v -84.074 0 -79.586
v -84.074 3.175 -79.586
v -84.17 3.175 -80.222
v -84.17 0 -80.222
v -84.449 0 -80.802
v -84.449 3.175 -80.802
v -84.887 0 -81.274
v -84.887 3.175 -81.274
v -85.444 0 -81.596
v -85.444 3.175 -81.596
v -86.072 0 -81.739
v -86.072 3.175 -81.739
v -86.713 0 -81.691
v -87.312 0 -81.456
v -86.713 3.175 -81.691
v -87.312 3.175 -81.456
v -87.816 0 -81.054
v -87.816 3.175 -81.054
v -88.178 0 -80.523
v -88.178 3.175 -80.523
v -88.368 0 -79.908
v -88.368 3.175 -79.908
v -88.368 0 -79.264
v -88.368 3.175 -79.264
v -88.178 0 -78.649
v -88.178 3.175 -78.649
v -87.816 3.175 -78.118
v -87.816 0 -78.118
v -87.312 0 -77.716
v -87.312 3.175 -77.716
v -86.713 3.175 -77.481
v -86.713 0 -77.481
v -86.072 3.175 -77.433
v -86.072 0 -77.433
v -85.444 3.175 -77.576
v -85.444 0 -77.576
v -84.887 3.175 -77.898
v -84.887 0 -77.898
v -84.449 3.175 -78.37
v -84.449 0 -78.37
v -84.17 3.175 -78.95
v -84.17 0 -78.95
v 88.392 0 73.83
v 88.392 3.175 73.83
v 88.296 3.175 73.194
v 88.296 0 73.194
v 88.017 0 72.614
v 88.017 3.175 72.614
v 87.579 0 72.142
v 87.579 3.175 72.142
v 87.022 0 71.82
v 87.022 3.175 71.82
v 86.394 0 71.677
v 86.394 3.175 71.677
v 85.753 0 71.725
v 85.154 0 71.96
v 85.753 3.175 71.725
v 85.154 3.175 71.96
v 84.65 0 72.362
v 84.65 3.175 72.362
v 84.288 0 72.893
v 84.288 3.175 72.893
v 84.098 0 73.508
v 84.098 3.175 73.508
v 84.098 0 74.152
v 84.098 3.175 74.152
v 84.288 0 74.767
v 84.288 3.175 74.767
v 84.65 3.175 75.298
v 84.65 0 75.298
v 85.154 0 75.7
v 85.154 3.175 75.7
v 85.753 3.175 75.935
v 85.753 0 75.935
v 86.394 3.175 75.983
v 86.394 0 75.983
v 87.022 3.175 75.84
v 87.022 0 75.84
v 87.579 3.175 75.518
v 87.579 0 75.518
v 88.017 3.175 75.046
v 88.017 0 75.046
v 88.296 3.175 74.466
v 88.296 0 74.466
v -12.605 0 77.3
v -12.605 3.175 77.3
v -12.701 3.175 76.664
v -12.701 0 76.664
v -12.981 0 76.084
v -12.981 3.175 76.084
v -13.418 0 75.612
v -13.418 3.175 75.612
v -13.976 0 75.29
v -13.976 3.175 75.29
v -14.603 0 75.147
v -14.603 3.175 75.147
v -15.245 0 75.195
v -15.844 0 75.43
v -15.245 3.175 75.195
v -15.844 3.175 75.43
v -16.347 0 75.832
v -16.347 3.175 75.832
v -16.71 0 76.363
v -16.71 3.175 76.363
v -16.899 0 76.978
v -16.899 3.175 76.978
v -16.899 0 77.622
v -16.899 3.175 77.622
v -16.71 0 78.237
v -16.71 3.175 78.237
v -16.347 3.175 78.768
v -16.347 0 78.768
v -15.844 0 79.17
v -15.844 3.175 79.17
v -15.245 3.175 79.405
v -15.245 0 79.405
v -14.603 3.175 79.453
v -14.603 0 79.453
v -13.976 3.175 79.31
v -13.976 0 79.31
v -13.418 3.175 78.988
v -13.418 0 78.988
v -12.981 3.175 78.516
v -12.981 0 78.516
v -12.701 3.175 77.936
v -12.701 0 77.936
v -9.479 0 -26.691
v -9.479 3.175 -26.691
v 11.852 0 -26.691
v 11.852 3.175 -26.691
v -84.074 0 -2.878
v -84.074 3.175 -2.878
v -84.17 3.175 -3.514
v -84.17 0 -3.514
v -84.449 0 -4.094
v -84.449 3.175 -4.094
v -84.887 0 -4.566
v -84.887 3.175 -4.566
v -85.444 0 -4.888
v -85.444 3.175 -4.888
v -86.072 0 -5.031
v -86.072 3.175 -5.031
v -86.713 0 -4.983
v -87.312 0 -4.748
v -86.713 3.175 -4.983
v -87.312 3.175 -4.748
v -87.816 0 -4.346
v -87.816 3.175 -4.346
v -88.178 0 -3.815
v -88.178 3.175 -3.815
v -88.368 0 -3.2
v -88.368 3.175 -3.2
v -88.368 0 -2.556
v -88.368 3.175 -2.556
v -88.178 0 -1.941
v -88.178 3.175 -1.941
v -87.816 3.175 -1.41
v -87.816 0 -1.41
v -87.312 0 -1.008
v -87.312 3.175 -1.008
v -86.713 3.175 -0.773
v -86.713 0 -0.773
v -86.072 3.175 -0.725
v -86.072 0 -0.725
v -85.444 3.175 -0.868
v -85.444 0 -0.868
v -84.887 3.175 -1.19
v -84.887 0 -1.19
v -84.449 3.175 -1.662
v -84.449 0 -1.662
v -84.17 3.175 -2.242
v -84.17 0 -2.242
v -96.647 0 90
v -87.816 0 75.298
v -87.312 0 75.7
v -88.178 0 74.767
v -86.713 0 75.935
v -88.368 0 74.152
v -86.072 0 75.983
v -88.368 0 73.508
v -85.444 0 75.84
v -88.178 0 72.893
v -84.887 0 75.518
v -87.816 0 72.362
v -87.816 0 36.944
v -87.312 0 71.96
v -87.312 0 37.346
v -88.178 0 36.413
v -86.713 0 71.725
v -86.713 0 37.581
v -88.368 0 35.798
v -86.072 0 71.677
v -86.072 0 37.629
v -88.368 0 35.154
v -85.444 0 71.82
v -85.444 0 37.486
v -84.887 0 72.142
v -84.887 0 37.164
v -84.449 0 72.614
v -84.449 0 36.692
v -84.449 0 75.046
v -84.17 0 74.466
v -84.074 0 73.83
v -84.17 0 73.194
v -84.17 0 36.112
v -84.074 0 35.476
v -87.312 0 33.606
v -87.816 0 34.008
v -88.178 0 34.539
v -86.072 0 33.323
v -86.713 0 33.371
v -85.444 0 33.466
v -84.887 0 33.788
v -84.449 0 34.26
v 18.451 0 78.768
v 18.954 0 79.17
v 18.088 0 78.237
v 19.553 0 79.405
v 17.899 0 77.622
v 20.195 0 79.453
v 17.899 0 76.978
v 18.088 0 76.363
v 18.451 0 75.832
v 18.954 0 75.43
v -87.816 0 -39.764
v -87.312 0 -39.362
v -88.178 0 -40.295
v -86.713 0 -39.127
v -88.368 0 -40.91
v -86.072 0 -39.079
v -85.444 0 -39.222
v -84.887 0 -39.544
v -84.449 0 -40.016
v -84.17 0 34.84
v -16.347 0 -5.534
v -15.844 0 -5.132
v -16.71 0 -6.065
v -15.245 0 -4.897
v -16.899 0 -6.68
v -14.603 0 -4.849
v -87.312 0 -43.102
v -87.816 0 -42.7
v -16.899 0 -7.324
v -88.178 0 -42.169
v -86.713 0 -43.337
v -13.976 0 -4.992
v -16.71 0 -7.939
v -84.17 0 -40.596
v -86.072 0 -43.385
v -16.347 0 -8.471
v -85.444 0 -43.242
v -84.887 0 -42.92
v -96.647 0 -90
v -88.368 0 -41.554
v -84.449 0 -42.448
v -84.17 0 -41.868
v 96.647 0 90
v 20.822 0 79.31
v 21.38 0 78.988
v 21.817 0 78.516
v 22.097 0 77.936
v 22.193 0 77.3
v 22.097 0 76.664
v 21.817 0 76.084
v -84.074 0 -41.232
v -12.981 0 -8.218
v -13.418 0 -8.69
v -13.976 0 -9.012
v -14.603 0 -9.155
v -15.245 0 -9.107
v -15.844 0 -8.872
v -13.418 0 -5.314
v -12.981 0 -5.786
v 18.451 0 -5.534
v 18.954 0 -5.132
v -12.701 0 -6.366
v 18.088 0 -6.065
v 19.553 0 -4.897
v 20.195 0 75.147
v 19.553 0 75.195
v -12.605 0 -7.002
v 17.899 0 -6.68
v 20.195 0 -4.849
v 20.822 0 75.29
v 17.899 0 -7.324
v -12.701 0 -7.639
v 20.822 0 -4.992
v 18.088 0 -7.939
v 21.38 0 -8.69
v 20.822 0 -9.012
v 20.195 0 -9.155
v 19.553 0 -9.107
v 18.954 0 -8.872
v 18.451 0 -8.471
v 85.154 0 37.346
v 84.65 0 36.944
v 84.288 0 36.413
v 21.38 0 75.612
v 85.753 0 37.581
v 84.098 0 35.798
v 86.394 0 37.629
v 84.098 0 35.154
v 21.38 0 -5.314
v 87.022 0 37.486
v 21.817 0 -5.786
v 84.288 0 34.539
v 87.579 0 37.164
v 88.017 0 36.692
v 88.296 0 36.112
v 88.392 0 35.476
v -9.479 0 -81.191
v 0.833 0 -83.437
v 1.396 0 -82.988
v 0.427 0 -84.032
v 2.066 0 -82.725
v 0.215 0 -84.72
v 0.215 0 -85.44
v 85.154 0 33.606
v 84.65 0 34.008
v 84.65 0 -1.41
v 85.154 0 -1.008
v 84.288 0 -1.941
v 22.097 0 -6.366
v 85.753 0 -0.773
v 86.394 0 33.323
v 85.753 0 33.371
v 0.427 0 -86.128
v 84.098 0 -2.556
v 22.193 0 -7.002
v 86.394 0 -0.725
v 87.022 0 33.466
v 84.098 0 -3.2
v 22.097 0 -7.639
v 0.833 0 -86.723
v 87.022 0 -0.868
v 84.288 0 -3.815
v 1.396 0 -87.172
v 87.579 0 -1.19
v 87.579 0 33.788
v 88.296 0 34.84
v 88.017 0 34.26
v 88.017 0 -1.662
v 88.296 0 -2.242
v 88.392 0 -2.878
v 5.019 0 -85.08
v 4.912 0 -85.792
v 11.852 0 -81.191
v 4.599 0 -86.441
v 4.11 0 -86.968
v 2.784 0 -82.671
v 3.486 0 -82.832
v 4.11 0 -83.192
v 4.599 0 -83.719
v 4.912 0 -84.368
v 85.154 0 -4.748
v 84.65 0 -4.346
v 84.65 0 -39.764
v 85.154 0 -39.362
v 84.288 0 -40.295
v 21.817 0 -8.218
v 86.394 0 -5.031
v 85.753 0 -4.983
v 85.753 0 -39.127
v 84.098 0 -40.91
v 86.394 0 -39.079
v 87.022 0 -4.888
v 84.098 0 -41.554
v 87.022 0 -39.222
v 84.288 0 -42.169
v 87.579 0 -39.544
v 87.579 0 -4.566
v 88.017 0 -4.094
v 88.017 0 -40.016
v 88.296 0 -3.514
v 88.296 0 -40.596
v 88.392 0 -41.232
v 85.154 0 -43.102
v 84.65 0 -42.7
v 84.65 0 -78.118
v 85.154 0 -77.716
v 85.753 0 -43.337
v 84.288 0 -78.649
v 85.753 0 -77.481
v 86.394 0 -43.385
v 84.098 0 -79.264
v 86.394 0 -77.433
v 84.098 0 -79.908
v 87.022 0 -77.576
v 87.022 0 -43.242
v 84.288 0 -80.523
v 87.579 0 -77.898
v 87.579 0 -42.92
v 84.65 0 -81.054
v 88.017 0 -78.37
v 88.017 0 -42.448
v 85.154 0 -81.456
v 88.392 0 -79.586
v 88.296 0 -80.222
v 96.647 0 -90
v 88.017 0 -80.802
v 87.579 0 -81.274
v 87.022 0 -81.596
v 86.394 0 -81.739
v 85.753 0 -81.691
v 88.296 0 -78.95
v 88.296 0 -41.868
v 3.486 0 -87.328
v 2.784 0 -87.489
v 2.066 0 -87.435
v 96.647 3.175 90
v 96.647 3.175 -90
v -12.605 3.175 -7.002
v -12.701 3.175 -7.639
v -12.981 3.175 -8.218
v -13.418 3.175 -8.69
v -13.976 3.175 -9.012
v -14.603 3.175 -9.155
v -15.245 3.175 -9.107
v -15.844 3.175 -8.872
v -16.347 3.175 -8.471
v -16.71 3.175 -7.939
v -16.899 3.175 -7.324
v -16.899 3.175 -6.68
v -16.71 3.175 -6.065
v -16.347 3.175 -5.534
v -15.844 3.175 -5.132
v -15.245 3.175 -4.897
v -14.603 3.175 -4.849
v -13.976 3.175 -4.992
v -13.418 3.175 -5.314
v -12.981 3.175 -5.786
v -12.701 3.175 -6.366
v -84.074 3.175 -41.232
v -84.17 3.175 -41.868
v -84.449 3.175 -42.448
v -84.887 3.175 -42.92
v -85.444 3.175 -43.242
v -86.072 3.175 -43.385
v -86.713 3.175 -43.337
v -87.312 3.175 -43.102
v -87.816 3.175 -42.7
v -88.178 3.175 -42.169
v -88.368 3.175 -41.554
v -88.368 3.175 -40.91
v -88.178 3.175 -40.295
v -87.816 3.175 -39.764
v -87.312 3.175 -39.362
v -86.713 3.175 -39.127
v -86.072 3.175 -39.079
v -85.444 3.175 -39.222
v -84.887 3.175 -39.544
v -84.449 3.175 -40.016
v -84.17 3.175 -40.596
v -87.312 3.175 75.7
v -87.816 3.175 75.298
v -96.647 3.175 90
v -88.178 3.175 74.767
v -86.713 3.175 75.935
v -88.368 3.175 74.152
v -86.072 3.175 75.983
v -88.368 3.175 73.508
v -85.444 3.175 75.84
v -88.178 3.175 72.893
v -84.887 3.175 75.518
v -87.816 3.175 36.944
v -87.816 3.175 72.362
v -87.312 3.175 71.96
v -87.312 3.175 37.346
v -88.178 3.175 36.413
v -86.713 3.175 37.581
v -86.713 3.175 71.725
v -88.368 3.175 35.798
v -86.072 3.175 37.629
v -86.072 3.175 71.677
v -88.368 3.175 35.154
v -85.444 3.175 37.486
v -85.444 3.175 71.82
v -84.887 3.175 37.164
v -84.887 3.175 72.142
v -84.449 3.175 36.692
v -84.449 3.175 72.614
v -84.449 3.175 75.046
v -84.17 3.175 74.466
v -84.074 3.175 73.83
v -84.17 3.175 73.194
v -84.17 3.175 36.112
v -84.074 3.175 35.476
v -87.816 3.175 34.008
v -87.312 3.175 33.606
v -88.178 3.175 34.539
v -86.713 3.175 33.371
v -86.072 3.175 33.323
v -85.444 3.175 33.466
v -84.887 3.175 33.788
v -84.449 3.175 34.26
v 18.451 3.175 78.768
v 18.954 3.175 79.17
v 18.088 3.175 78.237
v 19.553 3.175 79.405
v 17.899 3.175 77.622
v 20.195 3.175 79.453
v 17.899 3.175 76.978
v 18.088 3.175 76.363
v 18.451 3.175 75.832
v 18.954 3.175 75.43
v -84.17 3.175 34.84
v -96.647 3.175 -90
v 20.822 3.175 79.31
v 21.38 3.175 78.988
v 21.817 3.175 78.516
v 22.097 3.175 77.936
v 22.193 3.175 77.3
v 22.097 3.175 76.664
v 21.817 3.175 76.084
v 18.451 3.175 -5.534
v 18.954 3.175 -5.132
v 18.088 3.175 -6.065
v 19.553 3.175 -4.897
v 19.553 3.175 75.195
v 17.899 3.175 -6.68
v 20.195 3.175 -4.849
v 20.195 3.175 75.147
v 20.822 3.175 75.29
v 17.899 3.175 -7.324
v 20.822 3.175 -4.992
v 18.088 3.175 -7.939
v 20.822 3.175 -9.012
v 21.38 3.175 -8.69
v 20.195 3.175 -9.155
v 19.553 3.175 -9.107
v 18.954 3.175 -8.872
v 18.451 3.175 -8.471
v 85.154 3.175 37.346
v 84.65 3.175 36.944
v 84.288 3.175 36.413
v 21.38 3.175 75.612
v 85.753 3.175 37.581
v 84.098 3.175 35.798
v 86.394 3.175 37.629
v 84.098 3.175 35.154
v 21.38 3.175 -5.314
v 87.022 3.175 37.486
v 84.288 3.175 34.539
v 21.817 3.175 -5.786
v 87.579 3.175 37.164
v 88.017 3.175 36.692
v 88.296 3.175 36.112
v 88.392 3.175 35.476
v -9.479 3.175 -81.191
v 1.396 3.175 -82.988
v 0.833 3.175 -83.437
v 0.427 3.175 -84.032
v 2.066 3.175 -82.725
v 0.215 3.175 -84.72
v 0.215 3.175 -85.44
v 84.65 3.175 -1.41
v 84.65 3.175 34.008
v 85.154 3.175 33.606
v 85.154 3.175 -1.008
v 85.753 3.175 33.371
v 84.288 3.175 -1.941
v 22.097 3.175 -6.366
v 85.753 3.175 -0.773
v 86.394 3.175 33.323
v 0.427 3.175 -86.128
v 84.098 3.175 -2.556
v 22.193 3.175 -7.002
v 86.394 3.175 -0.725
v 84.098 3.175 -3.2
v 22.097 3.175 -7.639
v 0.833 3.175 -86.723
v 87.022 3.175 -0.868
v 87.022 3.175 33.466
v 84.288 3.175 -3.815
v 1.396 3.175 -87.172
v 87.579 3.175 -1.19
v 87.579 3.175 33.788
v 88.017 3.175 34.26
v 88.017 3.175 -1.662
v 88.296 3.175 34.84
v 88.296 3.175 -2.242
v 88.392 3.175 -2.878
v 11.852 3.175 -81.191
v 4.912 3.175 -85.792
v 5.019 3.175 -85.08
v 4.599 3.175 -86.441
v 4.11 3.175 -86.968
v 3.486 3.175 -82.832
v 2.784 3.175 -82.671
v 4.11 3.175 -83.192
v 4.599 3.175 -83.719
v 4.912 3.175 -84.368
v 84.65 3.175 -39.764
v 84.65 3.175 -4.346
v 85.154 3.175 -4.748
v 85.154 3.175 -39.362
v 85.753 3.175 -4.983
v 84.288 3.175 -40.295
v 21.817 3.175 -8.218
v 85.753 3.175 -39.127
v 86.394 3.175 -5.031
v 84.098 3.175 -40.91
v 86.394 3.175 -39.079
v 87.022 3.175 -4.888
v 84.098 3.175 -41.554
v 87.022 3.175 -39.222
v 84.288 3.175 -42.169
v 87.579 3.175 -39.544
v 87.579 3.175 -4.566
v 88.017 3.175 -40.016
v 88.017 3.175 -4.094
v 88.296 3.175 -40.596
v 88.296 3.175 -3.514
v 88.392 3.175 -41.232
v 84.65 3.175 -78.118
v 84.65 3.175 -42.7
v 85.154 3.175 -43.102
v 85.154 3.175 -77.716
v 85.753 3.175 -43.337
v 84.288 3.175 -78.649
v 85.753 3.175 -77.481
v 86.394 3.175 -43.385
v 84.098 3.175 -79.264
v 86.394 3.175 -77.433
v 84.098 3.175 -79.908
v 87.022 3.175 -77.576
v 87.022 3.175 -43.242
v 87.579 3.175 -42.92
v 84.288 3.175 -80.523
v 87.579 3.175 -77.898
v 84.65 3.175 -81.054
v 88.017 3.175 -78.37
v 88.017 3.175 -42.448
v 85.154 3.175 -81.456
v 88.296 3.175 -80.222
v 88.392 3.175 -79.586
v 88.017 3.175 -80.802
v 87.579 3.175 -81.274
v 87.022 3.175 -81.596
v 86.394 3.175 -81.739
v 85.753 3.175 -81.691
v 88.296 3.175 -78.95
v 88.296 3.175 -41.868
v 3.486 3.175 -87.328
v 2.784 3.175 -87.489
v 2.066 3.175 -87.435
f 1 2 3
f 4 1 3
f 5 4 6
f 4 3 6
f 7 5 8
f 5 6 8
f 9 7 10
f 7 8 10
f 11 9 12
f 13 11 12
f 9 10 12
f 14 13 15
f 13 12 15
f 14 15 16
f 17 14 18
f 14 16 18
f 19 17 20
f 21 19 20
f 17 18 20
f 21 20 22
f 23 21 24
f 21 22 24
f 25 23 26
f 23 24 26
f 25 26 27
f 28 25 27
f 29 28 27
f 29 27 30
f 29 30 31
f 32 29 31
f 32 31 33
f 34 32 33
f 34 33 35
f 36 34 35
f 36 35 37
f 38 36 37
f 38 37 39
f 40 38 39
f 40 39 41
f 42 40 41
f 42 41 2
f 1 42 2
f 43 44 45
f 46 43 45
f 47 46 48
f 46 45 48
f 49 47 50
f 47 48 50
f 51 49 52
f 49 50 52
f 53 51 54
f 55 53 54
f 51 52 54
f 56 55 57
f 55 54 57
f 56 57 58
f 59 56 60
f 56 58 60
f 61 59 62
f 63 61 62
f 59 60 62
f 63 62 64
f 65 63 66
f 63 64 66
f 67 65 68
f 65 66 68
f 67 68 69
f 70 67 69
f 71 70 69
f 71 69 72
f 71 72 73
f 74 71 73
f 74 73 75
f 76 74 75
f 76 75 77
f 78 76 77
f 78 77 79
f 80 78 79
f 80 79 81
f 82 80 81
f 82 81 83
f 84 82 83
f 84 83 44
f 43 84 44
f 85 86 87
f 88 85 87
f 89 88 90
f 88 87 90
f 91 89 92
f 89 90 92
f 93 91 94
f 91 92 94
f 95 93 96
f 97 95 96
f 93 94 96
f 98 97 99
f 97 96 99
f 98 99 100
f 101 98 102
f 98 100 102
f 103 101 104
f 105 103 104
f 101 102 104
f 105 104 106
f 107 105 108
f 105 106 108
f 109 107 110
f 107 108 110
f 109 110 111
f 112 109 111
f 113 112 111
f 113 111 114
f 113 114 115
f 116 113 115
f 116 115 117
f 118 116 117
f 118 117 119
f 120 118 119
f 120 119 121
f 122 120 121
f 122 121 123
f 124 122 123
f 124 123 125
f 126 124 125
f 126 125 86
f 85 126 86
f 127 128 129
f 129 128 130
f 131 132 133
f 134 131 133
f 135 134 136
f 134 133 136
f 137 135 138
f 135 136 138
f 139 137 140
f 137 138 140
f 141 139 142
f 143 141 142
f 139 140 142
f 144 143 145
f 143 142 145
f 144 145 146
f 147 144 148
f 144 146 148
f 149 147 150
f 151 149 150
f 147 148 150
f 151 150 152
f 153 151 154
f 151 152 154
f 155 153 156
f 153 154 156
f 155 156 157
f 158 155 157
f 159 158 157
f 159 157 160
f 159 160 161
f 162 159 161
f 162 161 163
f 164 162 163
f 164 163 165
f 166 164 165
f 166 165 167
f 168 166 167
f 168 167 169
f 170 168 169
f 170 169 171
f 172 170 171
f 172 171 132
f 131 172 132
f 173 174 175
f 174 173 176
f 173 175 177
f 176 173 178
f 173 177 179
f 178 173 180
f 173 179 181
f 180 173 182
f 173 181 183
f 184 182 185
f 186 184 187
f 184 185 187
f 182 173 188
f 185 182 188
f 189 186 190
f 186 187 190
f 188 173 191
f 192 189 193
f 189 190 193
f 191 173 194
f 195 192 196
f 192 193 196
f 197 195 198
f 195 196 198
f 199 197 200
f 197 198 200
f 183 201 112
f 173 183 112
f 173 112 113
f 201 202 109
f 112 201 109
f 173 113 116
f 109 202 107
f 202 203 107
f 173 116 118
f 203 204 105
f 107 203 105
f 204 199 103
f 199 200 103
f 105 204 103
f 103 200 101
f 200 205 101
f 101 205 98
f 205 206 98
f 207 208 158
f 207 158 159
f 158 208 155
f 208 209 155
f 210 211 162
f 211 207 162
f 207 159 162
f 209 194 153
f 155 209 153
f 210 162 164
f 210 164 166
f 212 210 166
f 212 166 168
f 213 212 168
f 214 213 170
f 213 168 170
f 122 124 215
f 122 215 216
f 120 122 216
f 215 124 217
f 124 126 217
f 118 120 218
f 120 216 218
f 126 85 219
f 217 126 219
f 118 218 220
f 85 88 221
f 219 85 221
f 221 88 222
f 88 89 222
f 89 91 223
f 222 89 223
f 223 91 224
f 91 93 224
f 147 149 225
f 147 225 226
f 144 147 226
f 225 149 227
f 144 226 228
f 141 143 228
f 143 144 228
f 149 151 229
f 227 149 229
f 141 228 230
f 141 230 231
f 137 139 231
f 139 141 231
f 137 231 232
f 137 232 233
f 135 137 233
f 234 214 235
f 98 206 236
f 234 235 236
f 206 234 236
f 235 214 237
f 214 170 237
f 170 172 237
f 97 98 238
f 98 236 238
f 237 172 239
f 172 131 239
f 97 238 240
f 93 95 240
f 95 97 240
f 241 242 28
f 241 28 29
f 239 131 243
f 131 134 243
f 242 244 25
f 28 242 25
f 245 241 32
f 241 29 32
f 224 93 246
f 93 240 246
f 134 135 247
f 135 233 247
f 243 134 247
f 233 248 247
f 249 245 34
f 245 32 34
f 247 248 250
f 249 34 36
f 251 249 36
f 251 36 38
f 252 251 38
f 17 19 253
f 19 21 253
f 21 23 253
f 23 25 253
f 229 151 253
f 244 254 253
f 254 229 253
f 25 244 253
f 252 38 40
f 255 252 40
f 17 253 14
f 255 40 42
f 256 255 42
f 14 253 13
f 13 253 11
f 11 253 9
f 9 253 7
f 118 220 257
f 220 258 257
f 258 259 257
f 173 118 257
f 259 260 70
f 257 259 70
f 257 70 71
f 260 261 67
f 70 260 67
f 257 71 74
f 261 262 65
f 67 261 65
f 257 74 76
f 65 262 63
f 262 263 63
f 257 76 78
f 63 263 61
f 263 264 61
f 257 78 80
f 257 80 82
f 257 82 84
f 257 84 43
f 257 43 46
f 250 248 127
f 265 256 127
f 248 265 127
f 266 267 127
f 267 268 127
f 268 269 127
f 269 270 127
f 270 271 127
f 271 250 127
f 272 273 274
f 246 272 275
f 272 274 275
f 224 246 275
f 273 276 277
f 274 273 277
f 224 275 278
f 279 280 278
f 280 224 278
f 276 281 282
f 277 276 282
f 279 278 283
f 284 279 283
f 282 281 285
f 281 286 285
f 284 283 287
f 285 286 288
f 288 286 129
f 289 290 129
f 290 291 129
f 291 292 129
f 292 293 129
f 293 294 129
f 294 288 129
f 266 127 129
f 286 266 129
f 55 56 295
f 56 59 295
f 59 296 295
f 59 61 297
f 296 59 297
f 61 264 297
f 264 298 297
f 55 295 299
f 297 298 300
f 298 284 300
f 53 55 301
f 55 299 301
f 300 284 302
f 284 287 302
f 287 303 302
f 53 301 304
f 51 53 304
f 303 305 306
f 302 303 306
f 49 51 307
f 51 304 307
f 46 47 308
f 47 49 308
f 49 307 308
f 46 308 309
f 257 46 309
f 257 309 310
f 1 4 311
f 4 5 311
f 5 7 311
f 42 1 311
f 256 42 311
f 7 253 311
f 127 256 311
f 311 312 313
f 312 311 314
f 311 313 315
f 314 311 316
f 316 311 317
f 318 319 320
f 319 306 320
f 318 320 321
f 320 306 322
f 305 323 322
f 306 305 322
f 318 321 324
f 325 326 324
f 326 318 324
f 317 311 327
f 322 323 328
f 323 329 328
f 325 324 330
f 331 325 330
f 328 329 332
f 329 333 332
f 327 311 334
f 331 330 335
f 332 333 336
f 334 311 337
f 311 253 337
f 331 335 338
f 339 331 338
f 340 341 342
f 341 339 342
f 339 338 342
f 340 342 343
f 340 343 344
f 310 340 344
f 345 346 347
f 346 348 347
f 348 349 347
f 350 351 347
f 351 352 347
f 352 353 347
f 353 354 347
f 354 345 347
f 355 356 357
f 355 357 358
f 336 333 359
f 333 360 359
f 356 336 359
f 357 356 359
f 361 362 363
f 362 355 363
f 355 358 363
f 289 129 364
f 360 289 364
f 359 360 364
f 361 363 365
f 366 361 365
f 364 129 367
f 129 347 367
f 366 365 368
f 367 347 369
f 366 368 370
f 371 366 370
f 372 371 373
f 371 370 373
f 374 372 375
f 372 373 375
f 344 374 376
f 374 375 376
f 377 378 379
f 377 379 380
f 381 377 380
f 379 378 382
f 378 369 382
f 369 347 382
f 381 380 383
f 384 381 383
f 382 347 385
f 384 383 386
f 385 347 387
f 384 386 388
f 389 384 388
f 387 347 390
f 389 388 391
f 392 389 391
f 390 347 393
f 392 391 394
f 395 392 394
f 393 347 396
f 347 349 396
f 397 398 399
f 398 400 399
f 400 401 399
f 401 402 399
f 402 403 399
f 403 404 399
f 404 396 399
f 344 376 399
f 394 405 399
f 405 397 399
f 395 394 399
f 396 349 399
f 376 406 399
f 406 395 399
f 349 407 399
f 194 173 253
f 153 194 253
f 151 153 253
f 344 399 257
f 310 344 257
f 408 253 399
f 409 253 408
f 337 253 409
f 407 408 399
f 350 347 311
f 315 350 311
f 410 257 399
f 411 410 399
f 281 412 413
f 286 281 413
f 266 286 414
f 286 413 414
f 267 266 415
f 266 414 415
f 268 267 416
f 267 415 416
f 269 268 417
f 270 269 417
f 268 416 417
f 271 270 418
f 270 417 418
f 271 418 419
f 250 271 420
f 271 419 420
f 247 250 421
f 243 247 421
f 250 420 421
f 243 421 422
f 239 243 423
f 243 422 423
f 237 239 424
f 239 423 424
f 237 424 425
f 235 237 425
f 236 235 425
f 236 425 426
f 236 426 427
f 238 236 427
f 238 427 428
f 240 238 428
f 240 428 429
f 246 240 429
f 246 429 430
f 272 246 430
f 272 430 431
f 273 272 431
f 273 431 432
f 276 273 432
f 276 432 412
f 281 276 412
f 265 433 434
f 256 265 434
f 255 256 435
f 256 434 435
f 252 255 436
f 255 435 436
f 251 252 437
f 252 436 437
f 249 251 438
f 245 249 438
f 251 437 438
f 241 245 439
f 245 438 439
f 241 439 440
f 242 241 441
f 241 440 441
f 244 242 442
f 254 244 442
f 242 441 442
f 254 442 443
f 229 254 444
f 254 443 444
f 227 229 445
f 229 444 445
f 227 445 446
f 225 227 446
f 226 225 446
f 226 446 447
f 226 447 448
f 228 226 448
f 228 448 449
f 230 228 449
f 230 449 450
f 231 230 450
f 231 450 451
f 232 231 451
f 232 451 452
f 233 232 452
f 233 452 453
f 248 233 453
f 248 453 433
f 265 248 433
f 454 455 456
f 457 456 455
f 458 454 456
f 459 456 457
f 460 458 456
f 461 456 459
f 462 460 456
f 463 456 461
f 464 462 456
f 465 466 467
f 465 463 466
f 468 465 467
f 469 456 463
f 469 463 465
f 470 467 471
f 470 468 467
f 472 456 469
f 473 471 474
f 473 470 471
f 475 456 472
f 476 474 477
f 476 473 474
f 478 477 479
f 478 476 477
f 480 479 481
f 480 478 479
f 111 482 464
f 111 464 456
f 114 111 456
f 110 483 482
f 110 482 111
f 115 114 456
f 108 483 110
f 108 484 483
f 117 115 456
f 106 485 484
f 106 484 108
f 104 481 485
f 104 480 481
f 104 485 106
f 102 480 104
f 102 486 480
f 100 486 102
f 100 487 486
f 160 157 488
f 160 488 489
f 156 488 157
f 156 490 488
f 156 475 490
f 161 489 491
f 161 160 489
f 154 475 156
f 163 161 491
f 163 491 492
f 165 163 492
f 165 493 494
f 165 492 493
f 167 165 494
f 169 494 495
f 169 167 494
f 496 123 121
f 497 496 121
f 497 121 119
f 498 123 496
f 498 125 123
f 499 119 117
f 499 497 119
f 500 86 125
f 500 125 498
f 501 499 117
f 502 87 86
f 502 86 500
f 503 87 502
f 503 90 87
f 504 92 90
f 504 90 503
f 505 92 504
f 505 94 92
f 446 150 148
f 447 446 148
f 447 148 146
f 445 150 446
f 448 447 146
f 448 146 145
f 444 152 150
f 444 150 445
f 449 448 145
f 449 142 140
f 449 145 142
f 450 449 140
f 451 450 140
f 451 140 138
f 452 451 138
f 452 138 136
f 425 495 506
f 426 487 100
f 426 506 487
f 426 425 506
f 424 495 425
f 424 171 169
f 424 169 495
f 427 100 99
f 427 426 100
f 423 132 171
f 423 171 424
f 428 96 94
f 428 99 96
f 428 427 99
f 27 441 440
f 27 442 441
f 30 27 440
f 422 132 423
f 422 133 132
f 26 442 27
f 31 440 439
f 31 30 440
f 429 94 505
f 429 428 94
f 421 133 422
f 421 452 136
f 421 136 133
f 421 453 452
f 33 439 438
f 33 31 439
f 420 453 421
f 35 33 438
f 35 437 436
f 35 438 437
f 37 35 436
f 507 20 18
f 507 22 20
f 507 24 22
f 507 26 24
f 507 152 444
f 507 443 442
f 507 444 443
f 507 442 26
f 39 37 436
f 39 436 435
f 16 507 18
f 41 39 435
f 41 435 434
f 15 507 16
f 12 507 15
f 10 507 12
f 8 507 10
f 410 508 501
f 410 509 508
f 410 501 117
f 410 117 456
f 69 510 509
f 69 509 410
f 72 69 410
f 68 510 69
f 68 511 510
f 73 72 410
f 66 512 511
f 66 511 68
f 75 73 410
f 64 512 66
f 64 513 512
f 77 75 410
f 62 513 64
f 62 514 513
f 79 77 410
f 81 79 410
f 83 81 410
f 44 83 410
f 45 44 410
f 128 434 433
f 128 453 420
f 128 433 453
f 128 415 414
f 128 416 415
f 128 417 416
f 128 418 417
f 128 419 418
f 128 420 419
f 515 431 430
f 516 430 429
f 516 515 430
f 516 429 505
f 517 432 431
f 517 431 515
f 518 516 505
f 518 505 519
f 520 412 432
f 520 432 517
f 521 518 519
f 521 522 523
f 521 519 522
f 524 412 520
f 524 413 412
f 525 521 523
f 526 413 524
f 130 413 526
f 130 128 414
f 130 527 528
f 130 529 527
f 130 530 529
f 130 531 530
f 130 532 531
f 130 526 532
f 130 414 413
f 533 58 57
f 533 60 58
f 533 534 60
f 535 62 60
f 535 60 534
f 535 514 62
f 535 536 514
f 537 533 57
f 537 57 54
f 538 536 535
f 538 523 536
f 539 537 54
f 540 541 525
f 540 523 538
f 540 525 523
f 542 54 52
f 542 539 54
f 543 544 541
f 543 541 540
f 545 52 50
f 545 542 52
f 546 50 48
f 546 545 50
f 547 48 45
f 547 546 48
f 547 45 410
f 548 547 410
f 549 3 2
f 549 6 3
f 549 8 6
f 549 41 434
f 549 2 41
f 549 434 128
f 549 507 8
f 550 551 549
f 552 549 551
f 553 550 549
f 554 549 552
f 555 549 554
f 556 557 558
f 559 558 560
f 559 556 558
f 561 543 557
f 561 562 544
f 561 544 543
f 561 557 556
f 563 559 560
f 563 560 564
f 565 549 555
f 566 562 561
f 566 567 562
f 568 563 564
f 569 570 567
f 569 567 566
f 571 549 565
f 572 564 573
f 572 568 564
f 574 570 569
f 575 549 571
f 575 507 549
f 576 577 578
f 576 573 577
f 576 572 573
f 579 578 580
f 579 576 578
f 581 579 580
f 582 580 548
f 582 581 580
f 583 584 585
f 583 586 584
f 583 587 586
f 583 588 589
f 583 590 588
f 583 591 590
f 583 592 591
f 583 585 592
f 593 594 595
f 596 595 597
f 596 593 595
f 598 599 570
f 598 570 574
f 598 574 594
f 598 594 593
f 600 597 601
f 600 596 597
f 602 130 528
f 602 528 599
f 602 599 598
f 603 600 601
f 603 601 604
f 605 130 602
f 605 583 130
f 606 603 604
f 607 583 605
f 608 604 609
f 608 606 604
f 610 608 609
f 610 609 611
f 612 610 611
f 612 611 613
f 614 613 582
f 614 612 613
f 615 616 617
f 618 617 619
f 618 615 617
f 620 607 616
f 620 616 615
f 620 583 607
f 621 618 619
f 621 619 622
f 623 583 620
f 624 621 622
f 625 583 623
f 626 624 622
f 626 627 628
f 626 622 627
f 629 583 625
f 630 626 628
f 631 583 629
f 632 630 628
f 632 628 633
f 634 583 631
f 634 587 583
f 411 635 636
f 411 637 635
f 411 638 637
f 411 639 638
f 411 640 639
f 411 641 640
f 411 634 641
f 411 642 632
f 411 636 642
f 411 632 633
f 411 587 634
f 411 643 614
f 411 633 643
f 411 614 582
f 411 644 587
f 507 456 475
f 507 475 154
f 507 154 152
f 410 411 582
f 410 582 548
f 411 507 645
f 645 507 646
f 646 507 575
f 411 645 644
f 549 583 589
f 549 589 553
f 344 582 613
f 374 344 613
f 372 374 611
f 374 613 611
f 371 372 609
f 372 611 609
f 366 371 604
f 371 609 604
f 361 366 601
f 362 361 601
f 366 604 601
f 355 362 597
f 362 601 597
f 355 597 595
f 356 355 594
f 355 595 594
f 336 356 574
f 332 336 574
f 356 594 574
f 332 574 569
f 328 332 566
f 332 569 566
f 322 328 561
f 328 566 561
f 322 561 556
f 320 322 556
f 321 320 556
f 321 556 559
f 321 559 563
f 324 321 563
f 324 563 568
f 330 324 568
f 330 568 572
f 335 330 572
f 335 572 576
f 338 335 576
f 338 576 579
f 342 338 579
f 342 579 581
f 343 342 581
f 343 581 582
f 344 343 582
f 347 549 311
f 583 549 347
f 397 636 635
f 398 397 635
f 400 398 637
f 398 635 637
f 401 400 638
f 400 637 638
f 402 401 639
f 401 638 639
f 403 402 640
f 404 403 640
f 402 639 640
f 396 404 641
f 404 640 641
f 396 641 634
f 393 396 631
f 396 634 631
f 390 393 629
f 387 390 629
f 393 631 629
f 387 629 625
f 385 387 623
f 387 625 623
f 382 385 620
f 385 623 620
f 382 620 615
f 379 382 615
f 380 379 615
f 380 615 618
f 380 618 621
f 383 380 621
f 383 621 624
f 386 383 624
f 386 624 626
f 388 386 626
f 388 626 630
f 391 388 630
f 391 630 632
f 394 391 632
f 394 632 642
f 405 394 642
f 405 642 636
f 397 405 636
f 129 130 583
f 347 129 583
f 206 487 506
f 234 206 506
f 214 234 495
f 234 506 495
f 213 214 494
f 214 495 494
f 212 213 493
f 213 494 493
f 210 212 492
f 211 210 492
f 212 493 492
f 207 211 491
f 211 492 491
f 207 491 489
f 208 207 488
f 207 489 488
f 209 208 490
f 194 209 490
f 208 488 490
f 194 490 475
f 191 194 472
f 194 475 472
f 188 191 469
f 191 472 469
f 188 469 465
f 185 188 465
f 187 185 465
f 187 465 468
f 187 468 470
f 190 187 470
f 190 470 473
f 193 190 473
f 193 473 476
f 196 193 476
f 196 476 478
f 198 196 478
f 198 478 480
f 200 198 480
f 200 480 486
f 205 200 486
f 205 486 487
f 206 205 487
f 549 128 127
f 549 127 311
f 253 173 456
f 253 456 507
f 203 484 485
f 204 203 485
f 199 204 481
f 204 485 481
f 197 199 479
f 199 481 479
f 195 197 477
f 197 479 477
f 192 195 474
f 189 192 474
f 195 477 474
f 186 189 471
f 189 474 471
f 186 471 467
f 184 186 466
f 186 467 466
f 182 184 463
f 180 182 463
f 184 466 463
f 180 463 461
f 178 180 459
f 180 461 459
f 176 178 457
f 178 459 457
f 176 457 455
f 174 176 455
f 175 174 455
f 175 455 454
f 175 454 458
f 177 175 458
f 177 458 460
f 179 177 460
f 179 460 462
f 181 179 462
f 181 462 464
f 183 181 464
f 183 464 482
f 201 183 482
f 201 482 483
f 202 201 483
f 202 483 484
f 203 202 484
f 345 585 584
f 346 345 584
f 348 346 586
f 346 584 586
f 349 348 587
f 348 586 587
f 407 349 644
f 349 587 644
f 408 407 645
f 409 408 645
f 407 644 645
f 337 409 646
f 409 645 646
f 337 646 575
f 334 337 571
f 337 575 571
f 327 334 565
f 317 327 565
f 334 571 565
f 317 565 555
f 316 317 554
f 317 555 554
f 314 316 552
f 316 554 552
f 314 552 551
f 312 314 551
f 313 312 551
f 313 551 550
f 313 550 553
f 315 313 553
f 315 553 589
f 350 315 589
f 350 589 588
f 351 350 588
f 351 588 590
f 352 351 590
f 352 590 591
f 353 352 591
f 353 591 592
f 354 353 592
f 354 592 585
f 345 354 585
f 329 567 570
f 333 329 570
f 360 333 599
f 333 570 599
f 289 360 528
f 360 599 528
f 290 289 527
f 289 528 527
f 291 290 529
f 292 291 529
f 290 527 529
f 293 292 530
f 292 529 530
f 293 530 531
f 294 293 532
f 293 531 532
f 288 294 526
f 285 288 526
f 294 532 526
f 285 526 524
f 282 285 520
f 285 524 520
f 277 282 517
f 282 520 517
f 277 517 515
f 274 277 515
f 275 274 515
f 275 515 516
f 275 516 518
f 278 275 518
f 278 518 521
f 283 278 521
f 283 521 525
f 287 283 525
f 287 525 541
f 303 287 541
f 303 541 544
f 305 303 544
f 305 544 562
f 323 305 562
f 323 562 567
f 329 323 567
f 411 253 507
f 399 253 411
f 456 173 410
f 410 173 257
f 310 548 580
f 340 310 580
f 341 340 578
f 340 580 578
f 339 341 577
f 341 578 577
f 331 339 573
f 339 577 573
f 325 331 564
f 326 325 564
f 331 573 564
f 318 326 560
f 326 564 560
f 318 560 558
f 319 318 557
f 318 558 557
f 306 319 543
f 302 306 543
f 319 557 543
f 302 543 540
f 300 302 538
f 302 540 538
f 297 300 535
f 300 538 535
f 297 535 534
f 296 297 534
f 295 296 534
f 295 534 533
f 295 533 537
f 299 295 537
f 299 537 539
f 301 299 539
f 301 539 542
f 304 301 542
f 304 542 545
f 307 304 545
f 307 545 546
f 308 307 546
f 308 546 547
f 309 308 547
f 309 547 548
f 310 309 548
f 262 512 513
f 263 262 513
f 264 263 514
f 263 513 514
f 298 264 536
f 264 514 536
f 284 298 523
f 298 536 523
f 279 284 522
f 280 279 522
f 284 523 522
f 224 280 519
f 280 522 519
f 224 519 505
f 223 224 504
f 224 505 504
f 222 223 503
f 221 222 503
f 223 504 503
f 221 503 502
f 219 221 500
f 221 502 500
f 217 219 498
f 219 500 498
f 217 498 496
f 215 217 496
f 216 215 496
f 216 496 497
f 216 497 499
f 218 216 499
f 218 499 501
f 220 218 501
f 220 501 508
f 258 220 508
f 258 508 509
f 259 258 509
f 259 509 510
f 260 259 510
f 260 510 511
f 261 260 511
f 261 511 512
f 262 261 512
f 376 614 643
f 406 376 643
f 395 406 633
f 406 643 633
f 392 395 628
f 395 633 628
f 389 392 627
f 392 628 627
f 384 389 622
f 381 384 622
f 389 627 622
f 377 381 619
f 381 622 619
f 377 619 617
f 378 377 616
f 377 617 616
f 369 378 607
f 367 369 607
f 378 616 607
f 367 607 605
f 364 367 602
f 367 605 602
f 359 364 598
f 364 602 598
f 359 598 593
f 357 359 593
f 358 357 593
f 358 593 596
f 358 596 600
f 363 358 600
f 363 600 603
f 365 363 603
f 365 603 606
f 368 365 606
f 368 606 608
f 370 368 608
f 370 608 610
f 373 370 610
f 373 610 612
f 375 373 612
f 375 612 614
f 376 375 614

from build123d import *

# Parameters (mm, degrees)
SKETCH1_W           = 193.294
SKETCH1_H           = 180
BOSS_EXTRUDE1_DEPTH = 3.175
SKETCH2_R           = 2.159
CUT_EXTRUDE1_DEPTH  = 4.175
SKETCH3_R           = 2.159
SKETCH3_R_2         = 2.415341229
CUT_EXTRUDE2_DEPTH  = 4.175
SKETCH4_W           = 21.330448395
SKETCH4_H           = 54.500274109
CUT_EXTRUDE3_DEPTH  = 4.175


with BuildPart() as part:
    # Sketch1 → Boss-Extrude1 (new body)
    with BuildSketch(Plane(origin=(0, 0, 0), x_dir=(1, 0, 0), z_dir=(0, 1, 0))):
        Rectangle(SKETCH1_W, SKETCH1_H)
    extrude(amount=BOSS_EXTRUDE1_DEPTH)

    # Sketch2 → Cut-Extrude1 (cut, through all)
    with BuildSketch(Plane(origin=(0, 3.175, 0), x_dir=(1, 0, 0), z_dir=(0, 1, 0))):
        with Locations((-86.233, 79.586)):
            Circle(SKETCH2_R)
        with Locations((86.233, 79.586)):
            Circle(SKETCH2_R)
        with Locations((86.233, 41.232)):
            Circle(SKETCH2_R)
        with Locations((86.233, 2.878)):
            Circle(SKETCH2_R)
        with Locations((86.233, -35.476)):
            Circle(SKETCH2_R)
        with Locations((-86.233, 41.232)):
            Circle(SKETCH2_R)
        with Locations((-86.233, 2.878)):
            Circle(SKETCH2_R)
        with Locations((-86.233, -35.476)):
            Circle(SKETCH2_R)
        with Locations((-86.233, -73.83)):
            Circle(SKETCH2_R)
        with Locations((86.233, -73.83)):
            Circle(SKETCH2_R)
    extrude(amount=-CUT_EXTRUDE1_DEPTH, mode=Mode.SUBTRACT)

    # Sketch3 → Cut-Extrude2 (cut, through all)
    with BuildSketch(Plane(origin=(0, 3.175, 0), x_dir=(1, 0, 0), z_dir=(0, 1, 0))):
        with Locations((-14.76439348, 7.002233071)):
            Circle(SKETCH3_R)
        with Locations((20.03360652, 7.002233071)):
            Circle(SKETCH3_R)
        with Locations((20.03360652, -77.3)):
            Circle(SKETCH3_R)
        with Locations((-14.76439348, -77.3)):
            Circle(SKETCH3_R)
        with Locations((2.60360652, 85.080051335)):
            Circle(SKETCH3_R_2)
    extrude(amount=-CUT_EXTRUDE2_DEPTH, mode=Mode.SUBTRACT)

    # Sketch4 → Cut-Extrude3 (cut, through all)
    with BuildSketch(Plane(origin=(0, 3.175, 0), x_dir=(1, 0, 0), z_dir=(0, 1, 0))):
        with Locations((1.186420924, 53.941345115)):
            Rectangle(SKETCH4_W, SKETCH4_H)
    extrude(amount=-CUT_EXTRUDE3_DEPTH, mode=Mode.SUBTRACT)


solid = part.part
